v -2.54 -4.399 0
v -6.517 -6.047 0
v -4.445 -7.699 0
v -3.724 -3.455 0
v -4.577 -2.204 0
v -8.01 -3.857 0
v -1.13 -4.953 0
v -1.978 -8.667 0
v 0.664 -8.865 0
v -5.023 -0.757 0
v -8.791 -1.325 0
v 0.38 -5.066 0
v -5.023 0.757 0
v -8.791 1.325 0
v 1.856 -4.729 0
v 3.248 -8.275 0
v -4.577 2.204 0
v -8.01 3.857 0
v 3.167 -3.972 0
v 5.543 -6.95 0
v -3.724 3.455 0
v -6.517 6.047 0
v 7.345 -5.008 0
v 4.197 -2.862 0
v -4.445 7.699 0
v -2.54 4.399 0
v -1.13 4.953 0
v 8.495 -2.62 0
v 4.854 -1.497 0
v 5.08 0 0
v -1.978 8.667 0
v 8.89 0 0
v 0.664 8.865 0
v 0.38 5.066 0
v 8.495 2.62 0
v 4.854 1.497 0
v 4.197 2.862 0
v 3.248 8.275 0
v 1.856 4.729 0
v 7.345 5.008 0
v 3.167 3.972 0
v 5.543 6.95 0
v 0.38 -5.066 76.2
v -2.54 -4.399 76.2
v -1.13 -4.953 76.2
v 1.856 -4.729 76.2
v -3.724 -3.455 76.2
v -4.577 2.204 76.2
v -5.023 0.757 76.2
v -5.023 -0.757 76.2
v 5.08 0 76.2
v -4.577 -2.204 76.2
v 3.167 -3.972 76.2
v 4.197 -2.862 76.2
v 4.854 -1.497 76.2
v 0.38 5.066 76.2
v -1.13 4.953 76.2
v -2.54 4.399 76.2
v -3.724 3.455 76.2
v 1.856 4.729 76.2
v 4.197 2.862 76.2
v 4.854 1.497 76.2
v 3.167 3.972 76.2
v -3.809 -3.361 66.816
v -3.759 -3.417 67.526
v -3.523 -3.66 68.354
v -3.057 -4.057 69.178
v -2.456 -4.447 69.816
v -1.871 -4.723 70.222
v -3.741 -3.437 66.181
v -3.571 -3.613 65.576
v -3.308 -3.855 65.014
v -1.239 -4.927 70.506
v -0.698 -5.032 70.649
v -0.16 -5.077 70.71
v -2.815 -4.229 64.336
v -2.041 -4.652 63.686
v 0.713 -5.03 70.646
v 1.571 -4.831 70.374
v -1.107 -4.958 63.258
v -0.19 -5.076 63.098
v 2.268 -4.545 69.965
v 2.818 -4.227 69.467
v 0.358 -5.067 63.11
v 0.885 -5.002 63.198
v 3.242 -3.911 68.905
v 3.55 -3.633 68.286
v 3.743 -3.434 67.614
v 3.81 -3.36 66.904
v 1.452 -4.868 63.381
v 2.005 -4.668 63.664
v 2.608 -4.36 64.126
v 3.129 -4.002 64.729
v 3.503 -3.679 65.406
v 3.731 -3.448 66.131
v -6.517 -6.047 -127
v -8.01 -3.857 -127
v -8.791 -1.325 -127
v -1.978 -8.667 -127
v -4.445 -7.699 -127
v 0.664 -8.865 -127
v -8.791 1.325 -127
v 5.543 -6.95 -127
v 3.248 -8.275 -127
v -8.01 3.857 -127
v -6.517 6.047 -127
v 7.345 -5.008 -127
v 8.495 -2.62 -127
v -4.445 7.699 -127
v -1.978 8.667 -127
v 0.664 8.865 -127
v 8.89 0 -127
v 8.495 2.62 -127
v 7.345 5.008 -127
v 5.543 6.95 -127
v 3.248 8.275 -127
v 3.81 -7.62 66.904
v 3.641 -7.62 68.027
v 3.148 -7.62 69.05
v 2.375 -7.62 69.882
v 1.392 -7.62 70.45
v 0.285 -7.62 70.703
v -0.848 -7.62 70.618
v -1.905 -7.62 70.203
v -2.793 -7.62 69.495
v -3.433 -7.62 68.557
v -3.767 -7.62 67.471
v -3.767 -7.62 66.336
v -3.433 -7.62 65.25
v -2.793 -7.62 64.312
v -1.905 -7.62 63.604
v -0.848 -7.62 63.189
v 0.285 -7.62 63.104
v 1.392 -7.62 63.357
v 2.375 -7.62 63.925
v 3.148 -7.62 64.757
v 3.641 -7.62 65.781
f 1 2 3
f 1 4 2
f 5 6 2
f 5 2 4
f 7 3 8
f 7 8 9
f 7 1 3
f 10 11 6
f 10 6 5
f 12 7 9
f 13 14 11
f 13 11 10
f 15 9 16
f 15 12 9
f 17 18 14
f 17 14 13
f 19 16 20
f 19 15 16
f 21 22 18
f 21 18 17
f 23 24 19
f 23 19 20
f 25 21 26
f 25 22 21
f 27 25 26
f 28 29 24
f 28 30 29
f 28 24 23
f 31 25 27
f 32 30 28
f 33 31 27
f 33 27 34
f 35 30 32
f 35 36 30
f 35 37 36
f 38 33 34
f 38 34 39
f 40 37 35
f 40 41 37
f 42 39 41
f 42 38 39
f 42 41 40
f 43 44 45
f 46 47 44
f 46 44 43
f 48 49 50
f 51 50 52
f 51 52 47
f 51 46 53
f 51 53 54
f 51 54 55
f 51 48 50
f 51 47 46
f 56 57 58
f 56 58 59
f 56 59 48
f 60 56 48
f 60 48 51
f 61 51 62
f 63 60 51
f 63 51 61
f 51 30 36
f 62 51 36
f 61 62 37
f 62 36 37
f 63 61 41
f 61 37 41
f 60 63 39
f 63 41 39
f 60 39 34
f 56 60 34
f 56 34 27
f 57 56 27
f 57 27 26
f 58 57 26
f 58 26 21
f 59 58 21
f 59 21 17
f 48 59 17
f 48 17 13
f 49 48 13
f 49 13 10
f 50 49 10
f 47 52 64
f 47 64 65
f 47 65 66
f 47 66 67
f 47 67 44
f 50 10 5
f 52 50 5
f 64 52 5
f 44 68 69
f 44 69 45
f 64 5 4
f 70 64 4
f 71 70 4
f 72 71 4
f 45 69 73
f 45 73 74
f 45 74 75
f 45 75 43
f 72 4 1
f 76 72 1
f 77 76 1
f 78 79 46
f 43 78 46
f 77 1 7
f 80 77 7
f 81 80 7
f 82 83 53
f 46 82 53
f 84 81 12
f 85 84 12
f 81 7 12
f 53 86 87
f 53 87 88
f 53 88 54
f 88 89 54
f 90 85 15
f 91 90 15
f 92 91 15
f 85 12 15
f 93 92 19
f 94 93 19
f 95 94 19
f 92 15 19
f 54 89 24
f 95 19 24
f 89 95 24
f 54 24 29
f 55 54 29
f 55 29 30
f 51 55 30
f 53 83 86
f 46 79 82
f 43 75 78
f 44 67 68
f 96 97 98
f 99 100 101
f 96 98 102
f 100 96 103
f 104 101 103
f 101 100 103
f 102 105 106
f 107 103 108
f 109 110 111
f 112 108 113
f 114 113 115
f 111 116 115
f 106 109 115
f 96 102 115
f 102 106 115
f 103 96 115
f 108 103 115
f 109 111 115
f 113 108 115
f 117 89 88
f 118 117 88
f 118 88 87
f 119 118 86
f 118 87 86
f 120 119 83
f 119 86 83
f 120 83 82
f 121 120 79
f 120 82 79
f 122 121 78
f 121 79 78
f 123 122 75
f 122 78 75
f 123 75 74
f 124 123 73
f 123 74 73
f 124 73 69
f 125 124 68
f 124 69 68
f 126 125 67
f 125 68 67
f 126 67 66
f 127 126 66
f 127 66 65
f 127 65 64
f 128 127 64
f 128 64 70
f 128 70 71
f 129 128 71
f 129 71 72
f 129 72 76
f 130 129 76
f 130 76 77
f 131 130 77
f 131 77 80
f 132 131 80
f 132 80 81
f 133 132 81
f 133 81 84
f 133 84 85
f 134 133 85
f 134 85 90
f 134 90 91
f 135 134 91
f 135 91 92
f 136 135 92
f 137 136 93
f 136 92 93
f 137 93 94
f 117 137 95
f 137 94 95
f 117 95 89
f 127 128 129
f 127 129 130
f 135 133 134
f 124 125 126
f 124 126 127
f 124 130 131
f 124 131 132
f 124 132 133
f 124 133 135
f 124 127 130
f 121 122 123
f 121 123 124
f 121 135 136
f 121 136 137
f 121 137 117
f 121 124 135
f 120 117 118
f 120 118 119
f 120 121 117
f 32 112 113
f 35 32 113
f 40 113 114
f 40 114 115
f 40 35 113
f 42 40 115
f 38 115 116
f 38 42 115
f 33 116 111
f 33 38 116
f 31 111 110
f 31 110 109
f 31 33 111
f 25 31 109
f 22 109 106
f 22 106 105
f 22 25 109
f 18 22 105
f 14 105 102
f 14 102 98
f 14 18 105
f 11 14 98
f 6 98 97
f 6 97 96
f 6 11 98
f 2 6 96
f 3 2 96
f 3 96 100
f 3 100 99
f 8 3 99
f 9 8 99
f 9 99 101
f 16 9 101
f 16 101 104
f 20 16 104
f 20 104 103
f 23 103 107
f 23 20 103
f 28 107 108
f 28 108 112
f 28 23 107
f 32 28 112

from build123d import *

# Parameters (mm, degrees)
F0_R     = 8.89
F1_DEPTH = 127
F2_R     = 5.08
F3_DEPTH = 76.2
F4_R     = 3.81
F5_DEPTH = 7.62


with BuildPart() as f1:
    # F0 (on Top) → F1 (new body)
    with BuildSketch(Plane.XY):
        Circle(F0_R)
    extrude(amount=-F1_DEPTH)

    # F2 (on Top) → F3 (join)
    with BuildSketch(Plane.XY):
        Circle(F2_R)
    extrude(amount=F3_DEPTH)

    # F4 (on Front) → F5 (join)
    with BuildSketch(Plane.XZ):
        with Locations((0, 66.903524)):
            Circle(F4_R)
    extrude(amount=F5_DEPTH)


solid = f1.part
